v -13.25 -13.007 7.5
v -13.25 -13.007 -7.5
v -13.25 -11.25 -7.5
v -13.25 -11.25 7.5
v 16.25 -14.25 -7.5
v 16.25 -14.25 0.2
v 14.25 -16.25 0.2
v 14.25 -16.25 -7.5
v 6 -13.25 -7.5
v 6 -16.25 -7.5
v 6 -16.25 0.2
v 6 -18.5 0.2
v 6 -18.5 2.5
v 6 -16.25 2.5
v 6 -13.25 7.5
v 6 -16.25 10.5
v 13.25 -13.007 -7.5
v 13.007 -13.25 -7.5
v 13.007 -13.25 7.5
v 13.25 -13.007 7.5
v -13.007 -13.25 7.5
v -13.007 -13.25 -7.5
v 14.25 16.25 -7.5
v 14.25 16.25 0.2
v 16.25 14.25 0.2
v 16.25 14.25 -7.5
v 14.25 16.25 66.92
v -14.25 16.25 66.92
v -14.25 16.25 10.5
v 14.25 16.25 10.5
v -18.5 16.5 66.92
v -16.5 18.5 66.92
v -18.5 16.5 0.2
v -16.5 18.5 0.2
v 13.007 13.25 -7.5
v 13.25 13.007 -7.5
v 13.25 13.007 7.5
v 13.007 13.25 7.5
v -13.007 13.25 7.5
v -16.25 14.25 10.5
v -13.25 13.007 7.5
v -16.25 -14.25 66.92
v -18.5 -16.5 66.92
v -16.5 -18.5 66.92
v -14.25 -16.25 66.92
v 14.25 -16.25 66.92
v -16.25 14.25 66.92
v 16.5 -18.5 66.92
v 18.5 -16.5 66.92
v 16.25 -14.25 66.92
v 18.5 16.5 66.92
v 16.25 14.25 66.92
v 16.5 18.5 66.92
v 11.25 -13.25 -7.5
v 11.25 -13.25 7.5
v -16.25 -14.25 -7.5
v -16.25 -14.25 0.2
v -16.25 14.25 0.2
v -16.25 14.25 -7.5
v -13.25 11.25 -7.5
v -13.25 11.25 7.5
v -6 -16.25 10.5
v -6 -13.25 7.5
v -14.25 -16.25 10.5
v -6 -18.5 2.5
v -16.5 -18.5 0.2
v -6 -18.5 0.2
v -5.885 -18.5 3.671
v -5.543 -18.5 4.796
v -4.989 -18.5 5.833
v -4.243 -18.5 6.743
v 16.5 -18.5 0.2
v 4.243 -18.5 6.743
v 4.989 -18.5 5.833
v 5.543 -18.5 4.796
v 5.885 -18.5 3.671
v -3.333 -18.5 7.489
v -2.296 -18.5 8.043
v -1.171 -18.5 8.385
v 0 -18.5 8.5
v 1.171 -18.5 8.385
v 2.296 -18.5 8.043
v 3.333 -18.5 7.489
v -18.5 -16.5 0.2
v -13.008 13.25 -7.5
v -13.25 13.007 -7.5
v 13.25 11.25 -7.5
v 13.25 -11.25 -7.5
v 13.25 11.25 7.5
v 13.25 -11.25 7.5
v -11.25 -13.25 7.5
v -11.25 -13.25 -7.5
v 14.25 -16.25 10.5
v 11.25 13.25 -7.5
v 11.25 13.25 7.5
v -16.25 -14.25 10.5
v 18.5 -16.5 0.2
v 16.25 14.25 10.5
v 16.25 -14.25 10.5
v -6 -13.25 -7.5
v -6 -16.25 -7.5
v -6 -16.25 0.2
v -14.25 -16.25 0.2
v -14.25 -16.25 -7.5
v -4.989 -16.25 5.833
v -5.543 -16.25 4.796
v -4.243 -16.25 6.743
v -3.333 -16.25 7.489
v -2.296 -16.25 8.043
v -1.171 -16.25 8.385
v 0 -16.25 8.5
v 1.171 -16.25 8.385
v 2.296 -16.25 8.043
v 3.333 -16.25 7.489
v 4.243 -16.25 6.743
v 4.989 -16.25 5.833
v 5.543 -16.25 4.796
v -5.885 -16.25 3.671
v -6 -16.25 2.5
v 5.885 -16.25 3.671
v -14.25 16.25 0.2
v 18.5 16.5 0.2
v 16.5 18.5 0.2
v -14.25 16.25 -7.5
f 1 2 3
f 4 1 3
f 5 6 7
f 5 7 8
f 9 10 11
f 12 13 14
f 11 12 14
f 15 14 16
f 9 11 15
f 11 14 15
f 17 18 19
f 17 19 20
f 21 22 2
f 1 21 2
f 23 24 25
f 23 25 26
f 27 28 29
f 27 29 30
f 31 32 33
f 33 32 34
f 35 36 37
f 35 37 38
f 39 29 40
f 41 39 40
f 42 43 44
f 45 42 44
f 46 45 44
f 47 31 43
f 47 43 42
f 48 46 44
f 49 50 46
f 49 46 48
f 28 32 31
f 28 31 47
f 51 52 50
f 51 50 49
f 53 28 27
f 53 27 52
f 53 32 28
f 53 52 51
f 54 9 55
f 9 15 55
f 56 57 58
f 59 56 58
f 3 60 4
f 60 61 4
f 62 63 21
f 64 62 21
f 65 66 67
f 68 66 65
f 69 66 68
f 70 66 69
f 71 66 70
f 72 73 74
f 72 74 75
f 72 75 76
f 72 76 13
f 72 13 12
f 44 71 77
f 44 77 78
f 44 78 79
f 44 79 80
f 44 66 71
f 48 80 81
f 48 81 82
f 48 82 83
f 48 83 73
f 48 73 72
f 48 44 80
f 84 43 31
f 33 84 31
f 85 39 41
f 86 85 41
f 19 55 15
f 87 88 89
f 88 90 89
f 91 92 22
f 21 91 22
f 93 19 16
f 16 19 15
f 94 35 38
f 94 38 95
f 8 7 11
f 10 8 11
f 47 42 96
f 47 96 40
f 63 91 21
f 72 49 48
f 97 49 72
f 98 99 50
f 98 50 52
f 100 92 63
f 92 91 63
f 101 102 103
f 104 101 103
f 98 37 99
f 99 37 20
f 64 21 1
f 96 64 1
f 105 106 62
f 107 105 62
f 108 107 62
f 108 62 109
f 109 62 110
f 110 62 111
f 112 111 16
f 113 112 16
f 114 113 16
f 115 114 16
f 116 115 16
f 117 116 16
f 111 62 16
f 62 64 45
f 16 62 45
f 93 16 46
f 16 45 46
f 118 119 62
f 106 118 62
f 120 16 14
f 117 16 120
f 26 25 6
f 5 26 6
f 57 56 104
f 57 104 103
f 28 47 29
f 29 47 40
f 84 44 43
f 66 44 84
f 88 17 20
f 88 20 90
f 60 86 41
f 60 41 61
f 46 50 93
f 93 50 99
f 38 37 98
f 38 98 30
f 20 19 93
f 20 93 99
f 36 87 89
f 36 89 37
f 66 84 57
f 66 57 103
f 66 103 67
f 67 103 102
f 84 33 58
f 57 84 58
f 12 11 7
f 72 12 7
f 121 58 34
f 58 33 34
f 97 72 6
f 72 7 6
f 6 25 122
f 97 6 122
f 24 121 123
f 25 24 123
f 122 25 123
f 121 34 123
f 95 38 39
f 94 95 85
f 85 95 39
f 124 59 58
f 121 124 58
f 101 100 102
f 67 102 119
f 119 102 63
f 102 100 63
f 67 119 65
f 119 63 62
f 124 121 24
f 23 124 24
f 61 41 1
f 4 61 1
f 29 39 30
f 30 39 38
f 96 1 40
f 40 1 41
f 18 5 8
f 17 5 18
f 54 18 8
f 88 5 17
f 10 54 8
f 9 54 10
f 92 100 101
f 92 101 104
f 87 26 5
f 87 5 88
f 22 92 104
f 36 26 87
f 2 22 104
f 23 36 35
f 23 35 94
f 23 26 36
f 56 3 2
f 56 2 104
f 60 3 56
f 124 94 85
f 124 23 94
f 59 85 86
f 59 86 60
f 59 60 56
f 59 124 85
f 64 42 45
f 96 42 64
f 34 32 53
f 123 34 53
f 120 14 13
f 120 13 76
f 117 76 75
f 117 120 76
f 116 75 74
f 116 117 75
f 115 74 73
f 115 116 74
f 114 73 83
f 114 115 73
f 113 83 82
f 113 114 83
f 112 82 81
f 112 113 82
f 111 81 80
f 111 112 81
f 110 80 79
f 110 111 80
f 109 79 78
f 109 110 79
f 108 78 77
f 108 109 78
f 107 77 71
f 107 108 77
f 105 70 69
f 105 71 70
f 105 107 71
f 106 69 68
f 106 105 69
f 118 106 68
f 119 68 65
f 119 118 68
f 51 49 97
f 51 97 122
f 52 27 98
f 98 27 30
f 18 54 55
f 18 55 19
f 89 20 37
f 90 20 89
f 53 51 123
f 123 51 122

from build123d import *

# Parameters (mm, degrees)
PAD003_DEPTH    = 7.5
SKETCH007_W     = 37
SKETCH007_H     = 37
SKETCH007_W_2   = 32.5
SKETCH007_H_2   = 32.5
PAD004_DEPTH    = 66.72
CHAMFER_SIZE    = 2
CHAMFER001_SIZE = 2.9999
POCKET_DEPTH    = 74.421
POCKET001_DEPTH = 18.501


with BuildPart() as part:
    # Sketch006 → Pad003 (new body, symmetric)
    with BuildSketch(Plane.XY):
        Polygon((-16.25, 16.25), (16.25, 16.25), (16.25, -16.25), (6, -16.25), (6, -13.25), (13.25, -13.25), (13.25, 13.25), (-13.25, 13.25), (-13.25, -13.25), (-6, -13.25), (-6, -16.25), (-16.25, -16.25), align=None)
    extrude(amount=PAD003_DEPTH, both=True)

    # Sketch007 (on DatumPlane) → Pad004 (join)
    with BuildSketch(Plane.XY.offset(66.92)):
        Rectangle(SKETCH007_W, SKETCH007_H)
        Rectangle(SKETCH007_W_2, SKETCH007_H_2, mode=Mode.SUBTRACT)
    extrude(amount=-PAD004_DEPTH)

    # Chamfer
    chamfer_edges = [part.edges().sort_by_distance(p)[0] for p in [
        (18.5, -18.5, 33.56),
        (-18.5, -18.5, 33.56),
        (-18.5, 18.5, 33.56),
        (18.5, 18.5, 33.56),
        (-16.25, -16.25, 37.21),
        (16.25, 16.25, 37.21),
        (16.25, -16.25, 37.21),
        (-16.25, 16.25, 37.21),
        (-13.25, 13.25, 0),
        (13.25, 13.25, 0),
        (13.25, -13.25, 0),
        (-13.25, -13.25, 0),
        (16.25, -16.25, -3.65),
        (-16.25, -16.25, -3.65),
        (-16.25, 16.25, -3.65),
        (16.25, 16.25, -3.65),
    ]]
    chamfer(chamfer_edges, length=CHAMFER_SIZE)

    # Chamfer001
    chamfer001_edges = [part.edges().sort_by_distance(p)[0] for p in [
        (-16.25, 0, 7.5),
        (-15.25, 15.25, 7.5),
        (0, 16.25, 7.5),
        (15.25, 15.25, 7.5),
        (16.25, 0, 7.5),
        (15.25, -15.25, 7.5),
        (10.125, -16.25, 7.5),
        (-15.25, -15.25, 7.5),
        (-10.125, -16.25, 7.5),
    ]]
    chamfer(chamfer001_edges, length=CHAMFER001_SIZE)

    # Sketch (on DatumPlane) → Pocket (cut, through all)
    with BuildSketch(Plane.XY.offset(66.92)):
        Polygon((-13.2501, -13.007401), (-13.25, -11.25), (-11.25, -13.25), (-13.007401, -13.2501), align=None)
        Polygon((11.25, -13.25), (13.007401, -13.2501), (13.2501, -13.007401), (13.25, -11.25), align=None)
        Polygon((-13.25, 11.25), (-11.25, 13.25), (-13.007501, 13.25), (-13.2501, 13.007401), align=None)
        Polygon((11.25, 13.25), (13.25, 11.25), (13.2501, 13.007401), (13.007401, 13.2501), align=None)
    extrude(amount=-POCKET_DEPTH, mode=Mode.SUBTRACT)

    # Sketch008 → Pocket001 (cut, through all)
    with BuildSketch(Plane(origin=(0, 0, -17.5), x_dir=(-1, 0, 0), z_dir=(0, -1, 0))):
        with BuildLine():
            Line((-6, -10), (6, -10))
            Line((6, -10), (6, -20))
            ThreePointArc((-6, -20), (0, -26), (6, -20))
            Line((-6, -20), (-6, -10))
        make_face()
    extrude(amount=POCKET001_DEPTH, mode=Mode.SUBTRACT)


solid = part.part
